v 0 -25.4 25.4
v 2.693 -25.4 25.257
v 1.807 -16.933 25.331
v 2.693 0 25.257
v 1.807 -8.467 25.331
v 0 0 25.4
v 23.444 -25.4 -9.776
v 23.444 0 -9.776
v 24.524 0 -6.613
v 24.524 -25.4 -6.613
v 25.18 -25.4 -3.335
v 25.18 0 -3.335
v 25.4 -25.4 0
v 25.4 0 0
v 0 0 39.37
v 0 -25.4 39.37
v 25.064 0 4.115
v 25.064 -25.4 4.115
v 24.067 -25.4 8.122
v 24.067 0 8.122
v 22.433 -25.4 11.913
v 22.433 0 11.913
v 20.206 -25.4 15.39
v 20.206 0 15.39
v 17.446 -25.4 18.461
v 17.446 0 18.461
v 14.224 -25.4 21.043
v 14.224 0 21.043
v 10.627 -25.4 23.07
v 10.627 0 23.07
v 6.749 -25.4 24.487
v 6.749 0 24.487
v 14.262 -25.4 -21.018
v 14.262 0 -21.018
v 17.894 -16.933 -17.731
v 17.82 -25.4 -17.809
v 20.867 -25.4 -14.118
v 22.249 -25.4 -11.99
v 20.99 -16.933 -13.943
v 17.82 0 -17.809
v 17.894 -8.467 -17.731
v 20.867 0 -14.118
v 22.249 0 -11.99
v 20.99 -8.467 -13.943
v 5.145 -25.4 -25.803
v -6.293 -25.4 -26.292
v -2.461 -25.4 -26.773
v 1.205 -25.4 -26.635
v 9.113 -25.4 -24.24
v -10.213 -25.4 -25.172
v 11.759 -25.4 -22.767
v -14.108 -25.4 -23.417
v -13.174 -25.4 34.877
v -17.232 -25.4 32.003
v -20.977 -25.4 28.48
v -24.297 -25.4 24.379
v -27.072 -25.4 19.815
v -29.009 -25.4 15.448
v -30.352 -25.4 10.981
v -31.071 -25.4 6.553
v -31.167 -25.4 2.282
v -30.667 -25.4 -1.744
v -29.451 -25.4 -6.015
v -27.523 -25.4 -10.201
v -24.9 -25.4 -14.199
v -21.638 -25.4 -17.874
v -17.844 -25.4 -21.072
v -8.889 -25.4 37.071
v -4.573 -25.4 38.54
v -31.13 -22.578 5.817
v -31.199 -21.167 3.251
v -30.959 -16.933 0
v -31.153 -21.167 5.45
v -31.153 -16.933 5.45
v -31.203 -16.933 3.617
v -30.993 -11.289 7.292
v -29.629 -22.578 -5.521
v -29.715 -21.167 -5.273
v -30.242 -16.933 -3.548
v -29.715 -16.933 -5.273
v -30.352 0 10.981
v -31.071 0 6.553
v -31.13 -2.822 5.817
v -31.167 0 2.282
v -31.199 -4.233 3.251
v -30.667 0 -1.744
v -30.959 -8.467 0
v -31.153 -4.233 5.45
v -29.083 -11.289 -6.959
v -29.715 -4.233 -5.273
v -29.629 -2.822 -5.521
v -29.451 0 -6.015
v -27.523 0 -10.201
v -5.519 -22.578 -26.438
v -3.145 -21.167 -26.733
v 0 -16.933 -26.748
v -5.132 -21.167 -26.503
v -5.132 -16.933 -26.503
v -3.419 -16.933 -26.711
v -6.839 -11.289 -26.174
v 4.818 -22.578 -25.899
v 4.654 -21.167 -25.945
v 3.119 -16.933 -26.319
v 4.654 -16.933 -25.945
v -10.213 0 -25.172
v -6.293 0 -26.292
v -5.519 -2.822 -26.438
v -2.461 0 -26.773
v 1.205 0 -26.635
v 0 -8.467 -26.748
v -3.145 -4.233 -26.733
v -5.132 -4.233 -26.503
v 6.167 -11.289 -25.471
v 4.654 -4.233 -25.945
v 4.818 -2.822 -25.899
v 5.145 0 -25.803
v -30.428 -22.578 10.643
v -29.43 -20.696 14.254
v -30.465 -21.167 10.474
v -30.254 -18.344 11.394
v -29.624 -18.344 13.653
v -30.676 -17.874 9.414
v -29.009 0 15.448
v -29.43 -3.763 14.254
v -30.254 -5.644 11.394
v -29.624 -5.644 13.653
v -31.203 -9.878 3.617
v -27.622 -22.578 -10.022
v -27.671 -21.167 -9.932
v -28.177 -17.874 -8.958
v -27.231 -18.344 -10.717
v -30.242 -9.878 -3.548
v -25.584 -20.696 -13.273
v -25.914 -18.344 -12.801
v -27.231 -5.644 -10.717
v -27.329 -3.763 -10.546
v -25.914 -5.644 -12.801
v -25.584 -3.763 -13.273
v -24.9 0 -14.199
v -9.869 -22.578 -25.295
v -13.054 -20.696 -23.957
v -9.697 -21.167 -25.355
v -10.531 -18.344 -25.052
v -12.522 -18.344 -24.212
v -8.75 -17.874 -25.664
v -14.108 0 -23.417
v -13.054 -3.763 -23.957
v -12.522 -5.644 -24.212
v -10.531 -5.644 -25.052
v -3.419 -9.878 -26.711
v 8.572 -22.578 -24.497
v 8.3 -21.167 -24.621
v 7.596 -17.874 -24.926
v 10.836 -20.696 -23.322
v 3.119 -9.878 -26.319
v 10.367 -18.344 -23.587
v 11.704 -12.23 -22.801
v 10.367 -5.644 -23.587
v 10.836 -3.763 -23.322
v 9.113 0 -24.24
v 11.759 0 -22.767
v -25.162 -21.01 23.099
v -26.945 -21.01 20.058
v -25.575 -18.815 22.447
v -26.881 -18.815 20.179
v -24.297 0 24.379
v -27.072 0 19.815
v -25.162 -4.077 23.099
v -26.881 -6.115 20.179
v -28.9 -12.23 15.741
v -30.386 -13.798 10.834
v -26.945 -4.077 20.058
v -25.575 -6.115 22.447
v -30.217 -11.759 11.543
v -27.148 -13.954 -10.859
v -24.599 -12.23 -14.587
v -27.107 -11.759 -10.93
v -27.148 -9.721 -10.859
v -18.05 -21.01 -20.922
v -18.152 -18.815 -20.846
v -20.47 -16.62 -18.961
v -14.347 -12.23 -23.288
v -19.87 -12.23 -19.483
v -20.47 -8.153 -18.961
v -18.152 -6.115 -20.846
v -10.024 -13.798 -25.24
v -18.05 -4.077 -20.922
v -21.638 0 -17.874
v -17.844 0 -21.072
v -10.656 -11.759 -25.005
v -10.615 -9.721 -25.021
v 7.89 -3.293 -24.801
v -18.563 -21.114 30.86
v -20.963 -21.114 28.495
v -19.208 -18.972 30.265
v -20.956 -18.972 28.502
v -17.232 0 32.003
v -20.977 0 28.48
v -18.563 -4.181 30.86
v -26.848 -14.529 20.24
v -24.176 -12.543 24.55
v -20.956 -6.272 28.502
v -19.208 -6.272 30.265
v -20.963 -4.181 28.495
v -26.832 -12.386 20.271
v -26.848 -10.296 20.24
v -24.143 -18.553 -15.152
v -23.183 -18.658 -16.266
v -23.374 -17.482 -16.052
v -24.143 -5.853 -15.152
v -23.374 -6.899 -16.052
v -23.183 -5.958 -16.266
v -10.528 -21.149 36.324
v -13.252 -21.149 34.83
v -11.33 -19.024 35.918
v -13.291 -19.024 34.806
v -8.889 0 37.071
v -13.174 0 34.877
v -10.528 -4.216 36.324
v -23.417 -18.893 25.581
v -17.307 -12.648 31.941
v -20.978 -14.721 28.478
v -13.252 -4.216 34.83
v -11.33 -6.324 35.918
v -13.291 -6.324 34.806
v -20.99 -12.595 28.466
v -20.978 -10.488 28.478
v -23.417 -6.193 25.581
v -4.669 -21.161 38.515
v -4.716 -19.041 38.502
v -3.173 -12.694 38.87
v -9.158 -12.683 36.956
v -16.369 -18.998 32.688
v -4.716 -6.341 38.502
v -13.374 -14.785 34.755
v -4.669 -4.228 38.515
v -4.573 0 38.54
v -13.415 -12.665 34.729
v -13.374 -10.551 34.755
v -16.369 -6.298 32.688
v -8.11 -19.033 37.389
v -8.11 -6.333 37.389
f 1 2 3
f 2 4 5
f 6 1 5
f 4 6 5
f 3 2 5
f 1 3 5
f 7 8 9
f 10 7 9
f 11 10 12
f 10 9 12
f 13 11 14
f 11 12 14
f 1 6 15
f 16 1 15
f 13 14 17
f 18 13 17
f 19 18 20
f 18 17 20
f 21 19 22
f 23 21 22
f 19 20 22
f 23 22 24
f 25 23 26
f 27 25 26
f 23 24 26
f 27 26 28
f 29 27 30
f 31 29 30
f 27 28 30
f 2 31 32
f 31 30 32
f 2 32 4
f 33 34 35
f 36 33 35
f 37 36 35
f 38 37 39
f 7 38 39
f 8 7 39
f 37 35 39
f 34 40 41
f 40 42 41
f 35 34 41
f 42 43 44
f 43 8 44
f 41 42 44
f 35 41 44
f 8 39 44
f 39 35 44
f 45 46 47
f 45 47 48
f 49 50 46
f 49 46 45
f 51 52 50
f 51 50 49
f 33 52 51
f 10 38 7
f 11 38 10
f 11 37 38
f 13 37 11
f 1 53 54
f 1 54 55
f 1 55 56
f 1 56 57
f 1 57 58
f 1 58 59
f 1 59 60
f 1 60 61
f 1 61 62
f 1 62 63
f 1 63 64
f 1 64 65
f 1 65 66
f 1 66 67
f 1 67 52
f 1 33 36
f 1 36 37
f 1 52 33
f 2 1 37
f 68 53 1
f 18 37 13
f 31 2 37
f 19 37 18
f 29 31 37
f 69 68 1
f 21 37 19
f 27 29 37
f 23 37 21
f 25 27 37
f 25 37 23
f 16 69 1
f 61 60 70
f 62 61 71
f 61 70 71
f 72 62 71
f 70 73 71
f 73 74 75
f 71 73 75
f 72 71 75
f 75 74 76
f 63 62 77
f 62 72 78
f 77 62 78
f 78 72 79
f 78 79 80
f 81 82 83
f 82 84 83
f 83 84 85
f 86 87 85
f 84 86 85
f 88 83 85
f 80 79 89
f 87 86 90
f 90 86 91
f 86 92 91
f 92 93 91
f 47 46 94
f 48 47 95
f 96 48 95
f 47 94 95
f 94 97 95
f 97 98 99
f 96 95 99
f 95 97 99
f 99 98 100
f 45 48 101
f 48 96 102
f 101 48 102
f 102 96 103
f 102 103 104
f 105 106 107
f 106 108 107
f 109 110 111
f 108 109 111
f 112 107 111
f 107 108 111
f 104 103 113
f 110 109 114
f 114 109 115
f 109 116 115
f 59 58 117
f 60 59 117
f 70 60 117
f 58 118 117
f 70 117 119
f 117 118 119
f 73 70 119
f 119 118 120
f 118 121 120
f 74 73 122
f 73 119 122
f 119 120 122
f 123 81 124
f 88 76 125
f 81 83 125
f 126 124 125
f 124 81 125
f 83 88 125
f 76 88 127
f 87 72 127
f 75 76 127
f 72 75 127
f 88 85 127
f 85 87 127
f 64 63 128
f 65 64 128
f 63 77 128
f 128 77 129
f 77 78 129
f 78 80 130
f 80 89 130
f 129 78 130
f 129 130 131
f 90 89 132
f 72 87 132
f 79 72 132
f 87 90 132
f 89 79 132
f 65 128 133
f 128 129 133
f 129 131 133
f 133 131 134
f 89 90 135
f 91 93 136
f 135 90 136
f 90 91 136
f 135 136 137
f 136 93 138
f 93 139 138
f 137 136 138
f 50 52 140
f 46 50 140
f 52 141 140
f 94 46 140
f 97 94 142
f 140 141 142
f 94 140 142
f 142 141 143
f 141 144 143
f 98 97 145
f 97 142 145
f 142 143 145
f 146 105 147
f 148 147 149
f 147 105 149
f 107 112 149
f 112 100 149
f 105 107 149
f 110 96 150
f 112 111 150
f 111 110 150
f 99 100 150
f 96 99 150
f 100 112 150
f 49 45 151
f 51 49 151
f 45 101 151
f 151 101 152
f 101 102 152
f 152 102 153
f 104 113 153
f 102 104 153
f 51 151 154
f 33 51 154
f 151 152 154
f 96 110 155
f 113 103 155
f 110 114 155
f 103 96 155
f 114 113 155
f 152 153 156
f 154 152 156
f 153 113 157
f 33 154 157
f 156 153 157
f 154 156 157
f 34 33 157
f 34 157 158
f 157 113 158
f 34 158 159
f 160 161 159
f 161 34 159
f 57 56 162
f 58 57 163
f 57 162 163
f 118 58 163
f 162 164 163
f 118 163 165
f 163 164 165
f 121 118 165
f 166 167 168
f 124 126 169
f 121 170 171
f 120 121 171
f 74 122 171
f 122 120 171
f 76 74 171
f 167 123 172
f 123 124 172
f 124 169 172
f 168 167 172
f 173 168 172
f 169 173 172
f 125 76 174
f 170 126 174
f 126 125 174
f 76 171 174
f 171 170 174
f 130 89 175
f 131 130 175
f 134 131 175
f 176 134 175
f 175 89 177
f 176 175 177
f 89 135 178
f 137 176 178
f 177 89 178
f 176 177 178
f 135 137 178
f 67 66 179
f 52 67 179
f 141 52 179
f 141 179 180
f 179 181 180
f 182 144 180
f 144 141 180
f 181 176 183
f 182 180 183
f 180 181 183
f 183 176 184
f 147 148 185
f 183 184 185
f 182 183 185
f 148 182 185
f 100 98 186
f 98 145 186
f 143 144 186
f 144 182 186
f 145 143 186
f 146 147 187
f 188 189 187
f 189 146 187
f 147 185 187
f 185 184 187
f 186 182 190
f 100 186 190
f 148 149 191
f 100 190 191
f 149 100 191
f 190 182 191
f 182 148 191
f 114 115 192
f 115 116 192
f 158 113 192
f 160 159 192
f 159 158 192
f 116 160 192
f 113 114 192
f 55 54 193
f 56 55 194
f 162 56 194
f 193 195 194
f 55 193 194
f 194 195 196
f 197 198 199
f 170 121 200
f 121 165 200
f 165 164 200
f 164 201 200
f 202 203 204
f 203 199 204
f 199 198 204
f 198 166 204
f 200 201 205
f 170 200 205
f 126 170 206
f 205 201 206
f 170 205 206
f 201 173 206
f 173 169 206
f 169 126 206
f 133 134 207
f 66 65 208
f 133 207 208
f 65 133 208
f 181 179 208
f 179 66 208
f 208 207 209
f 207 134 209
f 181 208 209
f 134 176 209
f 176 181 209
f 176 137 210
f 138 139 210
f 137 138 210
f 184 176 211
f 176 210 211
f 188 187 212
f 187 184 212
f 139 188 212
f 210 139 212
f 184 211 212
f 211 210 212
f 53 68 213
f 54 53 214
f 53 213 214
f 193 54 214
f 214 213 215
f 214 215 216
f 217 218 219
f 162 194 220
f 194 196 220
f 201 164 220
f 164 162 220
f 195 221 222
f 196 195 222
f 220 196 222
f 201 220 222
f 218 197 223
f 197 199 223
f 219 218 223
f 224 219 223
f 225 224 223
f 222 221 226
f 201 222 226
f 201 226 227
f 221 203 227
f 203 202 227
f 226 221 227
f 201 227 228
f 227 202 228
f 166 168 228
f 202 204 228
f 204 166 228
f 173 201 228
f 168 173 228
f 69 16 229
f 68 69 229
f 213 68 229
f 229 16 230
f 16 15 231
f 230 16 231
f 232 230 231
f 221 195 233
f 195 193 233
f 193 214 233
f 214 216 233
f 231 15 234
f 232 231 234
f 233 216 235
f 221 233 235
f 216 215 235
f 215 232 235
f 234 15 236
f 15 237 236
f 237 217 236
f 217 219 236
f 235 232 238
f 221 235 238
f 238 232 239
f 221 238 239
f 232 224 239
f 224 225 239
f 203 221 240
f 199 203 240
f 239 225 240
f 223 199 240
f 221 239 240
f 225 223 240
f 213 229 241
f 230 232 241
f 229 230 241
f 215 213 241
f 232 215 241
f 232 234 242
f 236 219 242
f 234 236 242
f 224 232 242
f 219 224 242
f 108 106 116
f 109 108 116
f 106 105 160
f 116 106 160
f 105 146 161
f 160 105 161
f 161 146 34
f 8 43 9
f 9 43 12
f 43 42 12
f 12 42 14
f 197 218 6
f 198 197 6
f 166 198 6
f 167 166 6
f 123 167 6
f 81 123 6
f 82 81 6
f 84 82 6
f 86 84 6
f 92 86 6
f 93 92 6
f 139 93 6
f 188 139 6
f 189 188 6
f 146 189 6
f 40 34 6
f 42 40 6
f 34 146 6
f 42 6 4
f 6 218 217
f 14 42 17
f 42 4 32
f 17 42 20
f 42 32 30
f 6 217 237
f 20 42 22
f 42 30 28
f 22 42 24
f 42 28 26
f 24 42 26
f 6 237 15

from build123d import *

# Parameters (mm, degrees)
F1_DEPTH = 25.4


with BuildPart() as f1:
    # F0 (on Front) → F1 (new body)
    with BuildSketch(Plane.XZ):
        with BuildLine():
            ThreePointArc((14.261975499, -21.0179935975), (-24.2797965125, -7.459992045), (0, 25.4))
            Line((0, 25.4), (0, 39.37))
            add(Edge.make_bspline(
                [(0, 39.37), (-19.553380087, 37.3347476125), (-45.5671340259, -1.5697728715), (-8.319397981, -32.2288283909), (10.069599463, -24.265725606), (14.261975499, -21.0179935975)],
                knots=[0, 0, 0, 0, 0.2762654828, 0.5259592689, 0.6180466386, 0.6180466386, 0.6180466386, 0.6180466386], degree=3))
        make_face()
        with BuildLine():
            ThreePointArc((23.4435268904, -9.7755330769), (24.9060794086, -4.9846974323), (25.4, 0))
            ThreePointArc((25.4, 0), (18.8885688435, 16.9818128315), (2.6927585006, 25.2568614768))
            add(Edge.make_bspline(
                [(2.6927585006, 25.2568614768), (1.8135864389, 25.3433698488), (0.9156429342, 25.3918395582), (0, 25.4)],
                knots=[0.9865811397, 0.9865811397, 0.9865811397, 0.9865811397, 1, 1, 1, 1], degree=3))
            ThreePointArc((0, 25.4), (-24.2797965125, -7.459992045), (14.261975499, -21.0179935975))
            add(Edge.make_bspline(
                [(14.261975499, -21.0179935975), (18.1280082, -18.0230718536), (21.3458508833, -14.0908635275), (23.4435268904, -9.7755330769)],
                knots=[0.6180466386, 0.6180466386, 0.6180466386, 0.6180466386, 0.7029657344, 0.7029657344, 0.7029657344, 0.7029657344], degree=3))
        make_face()
    extrude(amount=F1_DEPTH)


solid = f1.part
